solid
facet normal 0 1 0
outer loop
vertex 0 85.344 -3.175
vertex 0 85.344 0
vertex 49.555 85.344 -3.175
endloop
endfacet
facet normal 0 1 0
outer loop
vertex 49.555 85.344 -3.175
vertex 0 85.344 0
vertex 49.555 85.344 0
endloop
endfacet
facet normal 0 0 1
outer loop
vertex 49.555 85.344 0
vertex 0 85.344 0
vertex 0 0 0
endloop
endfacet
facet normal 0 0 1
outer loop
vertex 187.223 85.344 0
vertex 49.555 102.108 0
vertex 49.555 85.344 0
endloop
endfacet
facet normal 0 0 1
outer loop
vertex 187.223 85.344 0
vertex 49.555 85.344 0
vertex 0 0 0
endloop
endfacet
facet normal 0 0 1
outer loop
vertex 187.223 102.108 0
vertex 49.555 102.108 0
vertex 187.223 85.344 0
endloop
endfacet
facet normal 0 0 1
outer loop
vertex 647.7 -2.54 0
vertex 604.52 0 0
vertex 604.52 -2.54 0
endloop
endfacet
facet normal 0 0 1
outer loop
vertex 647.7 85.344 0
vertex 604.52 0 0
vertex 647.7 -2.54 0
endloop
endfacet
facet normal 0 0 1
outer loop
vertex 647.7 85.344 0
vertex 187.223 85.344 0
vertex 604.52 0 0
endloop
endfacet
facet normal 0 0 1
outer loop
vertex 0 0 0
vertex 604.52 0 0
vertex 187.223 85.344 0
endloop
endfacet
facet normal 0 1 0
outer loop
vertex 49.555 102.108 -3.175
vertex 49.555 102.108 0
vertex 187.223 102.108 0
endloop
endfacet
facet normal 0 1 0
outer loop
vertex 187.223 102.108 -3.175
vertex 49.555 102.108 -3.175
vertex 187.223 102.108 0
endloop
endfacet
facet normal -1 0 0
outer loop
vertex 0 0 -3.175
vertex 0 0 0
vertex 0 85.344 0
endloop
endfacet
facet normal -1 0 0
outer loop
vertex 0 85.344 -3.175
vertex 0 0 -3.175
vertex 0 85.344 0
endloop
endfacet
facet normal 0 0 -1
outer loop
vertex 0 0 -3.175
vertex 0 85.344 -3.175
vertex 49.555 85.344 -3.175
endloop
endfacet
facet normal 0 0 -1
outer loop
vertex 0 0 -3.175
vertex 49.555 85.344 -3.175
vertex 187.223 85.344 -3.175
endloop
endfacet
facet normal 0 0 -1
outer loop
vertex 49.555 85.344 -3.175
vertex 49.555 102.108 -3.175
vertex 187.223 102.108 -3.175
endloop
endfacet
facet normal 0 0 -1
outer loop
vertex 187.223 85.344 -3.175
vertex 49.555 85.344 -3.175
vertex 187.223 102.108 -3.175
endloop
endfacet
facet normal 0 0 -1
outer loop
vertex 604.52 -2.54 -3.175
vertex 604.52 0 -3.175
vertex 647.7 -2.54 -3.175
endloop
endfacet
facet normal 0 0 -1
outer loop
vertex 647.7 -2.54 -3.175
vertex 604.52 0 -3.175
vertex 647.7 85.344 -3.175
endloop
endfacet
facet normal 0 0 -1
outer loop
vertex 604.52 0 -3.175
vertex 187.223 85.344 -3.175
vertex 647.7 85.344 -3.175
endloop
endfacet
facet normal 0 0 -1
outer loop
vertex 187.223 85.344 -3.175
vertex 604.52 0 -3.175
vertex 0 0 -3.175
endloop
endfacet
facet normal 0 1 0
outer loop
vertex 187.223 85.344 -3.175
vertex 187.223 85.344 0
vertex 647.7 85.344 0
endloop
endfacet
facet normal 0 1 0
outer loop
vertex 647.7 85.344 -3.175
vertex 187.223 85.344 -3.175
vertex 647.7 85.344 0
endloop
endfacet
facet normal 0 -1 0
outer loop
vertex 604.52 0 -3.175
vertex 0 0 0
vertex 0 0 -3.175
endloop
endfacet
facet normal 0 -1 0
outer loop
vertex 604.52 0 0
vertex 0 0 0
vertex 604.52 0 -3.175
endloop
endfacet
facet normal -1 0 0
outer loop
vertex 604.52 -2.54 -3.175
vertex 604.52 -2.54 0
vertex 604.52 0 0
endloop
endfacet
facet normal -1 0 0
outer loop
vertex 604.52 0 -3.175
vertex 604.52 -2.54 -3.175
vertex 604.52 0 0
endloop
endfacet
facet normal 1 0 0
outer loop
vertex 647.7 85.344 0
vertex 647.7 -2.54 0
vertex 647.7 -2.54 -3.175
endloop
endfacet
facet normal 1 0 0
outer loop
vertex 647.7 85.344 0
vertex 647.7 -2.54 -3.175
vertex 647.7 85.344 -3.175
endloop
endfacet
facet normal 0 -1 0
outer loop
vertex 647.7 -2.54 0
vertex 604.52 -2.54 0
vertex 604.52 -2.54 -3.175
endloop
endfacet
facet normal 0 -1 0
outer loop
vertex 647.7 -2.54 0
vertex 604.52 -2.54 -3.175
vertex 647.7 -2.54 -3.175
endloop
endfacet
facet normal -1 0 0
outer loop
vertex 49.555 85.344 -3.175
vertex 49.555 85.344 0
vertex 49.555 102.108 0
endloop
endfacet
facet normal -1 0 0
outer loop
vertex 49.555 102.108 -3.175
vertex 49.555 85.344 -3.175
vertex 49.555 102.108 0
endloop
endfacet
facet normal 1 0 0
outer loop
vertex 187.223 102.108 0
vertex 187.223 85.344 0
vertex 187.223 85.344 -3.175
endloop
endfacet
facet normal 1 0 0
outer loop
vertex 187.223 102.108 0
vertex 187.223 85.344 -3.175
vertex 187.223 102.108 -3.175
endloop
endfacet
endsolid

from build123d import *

# Parameters (mm, degrees)
SKETCH1_W           = 647.7
SKETCH1_H           = 85.344
BOSS_EXTRUDE1_DEPTH = 3.175
SKETCH2_W           = 43.18
SKETCH2_H           = 2.54
BOSS_EXTRUDE2_DEPTH = 3.175
SKETCH3_W           = 137.668
SKETCH3_H           = 16.764
BOSS_EXTRUDE3_DEPTH = 3.175


with BuildPart() as part:
    # Sketch1 → Boss-Extrude1 (new body)
    with BuildSketch(Plane.XY):
        with Locations((323.85, 42.672)):
            Rectangle(SKETCH1_W, SKETCH1_H)
    extrude(amount=-BOSS_EXTRUDE1_DEPTH)

    # Sketch2 → Boss-Extrude2 (add)
    with BuildSketch(Plane.XY):
        with Locations((626.11, -1.27)):
            Rectangle(SKETCH2_W, SKETCH2_H)
    extrude(amount=-BOSS_EXTRUDE2_DEPTH)

    # Sketch3 → Boss-Extrude3 (add)
    with BuildSketch(Plane.XY):
        with Locations((118.3894, 93.726)):
            Rectangle(SKETCH3_W, SKETCH3_H)
    extrude(amount=-BOSS_EXTRUDE3_DEPTH)


solid = part.part
